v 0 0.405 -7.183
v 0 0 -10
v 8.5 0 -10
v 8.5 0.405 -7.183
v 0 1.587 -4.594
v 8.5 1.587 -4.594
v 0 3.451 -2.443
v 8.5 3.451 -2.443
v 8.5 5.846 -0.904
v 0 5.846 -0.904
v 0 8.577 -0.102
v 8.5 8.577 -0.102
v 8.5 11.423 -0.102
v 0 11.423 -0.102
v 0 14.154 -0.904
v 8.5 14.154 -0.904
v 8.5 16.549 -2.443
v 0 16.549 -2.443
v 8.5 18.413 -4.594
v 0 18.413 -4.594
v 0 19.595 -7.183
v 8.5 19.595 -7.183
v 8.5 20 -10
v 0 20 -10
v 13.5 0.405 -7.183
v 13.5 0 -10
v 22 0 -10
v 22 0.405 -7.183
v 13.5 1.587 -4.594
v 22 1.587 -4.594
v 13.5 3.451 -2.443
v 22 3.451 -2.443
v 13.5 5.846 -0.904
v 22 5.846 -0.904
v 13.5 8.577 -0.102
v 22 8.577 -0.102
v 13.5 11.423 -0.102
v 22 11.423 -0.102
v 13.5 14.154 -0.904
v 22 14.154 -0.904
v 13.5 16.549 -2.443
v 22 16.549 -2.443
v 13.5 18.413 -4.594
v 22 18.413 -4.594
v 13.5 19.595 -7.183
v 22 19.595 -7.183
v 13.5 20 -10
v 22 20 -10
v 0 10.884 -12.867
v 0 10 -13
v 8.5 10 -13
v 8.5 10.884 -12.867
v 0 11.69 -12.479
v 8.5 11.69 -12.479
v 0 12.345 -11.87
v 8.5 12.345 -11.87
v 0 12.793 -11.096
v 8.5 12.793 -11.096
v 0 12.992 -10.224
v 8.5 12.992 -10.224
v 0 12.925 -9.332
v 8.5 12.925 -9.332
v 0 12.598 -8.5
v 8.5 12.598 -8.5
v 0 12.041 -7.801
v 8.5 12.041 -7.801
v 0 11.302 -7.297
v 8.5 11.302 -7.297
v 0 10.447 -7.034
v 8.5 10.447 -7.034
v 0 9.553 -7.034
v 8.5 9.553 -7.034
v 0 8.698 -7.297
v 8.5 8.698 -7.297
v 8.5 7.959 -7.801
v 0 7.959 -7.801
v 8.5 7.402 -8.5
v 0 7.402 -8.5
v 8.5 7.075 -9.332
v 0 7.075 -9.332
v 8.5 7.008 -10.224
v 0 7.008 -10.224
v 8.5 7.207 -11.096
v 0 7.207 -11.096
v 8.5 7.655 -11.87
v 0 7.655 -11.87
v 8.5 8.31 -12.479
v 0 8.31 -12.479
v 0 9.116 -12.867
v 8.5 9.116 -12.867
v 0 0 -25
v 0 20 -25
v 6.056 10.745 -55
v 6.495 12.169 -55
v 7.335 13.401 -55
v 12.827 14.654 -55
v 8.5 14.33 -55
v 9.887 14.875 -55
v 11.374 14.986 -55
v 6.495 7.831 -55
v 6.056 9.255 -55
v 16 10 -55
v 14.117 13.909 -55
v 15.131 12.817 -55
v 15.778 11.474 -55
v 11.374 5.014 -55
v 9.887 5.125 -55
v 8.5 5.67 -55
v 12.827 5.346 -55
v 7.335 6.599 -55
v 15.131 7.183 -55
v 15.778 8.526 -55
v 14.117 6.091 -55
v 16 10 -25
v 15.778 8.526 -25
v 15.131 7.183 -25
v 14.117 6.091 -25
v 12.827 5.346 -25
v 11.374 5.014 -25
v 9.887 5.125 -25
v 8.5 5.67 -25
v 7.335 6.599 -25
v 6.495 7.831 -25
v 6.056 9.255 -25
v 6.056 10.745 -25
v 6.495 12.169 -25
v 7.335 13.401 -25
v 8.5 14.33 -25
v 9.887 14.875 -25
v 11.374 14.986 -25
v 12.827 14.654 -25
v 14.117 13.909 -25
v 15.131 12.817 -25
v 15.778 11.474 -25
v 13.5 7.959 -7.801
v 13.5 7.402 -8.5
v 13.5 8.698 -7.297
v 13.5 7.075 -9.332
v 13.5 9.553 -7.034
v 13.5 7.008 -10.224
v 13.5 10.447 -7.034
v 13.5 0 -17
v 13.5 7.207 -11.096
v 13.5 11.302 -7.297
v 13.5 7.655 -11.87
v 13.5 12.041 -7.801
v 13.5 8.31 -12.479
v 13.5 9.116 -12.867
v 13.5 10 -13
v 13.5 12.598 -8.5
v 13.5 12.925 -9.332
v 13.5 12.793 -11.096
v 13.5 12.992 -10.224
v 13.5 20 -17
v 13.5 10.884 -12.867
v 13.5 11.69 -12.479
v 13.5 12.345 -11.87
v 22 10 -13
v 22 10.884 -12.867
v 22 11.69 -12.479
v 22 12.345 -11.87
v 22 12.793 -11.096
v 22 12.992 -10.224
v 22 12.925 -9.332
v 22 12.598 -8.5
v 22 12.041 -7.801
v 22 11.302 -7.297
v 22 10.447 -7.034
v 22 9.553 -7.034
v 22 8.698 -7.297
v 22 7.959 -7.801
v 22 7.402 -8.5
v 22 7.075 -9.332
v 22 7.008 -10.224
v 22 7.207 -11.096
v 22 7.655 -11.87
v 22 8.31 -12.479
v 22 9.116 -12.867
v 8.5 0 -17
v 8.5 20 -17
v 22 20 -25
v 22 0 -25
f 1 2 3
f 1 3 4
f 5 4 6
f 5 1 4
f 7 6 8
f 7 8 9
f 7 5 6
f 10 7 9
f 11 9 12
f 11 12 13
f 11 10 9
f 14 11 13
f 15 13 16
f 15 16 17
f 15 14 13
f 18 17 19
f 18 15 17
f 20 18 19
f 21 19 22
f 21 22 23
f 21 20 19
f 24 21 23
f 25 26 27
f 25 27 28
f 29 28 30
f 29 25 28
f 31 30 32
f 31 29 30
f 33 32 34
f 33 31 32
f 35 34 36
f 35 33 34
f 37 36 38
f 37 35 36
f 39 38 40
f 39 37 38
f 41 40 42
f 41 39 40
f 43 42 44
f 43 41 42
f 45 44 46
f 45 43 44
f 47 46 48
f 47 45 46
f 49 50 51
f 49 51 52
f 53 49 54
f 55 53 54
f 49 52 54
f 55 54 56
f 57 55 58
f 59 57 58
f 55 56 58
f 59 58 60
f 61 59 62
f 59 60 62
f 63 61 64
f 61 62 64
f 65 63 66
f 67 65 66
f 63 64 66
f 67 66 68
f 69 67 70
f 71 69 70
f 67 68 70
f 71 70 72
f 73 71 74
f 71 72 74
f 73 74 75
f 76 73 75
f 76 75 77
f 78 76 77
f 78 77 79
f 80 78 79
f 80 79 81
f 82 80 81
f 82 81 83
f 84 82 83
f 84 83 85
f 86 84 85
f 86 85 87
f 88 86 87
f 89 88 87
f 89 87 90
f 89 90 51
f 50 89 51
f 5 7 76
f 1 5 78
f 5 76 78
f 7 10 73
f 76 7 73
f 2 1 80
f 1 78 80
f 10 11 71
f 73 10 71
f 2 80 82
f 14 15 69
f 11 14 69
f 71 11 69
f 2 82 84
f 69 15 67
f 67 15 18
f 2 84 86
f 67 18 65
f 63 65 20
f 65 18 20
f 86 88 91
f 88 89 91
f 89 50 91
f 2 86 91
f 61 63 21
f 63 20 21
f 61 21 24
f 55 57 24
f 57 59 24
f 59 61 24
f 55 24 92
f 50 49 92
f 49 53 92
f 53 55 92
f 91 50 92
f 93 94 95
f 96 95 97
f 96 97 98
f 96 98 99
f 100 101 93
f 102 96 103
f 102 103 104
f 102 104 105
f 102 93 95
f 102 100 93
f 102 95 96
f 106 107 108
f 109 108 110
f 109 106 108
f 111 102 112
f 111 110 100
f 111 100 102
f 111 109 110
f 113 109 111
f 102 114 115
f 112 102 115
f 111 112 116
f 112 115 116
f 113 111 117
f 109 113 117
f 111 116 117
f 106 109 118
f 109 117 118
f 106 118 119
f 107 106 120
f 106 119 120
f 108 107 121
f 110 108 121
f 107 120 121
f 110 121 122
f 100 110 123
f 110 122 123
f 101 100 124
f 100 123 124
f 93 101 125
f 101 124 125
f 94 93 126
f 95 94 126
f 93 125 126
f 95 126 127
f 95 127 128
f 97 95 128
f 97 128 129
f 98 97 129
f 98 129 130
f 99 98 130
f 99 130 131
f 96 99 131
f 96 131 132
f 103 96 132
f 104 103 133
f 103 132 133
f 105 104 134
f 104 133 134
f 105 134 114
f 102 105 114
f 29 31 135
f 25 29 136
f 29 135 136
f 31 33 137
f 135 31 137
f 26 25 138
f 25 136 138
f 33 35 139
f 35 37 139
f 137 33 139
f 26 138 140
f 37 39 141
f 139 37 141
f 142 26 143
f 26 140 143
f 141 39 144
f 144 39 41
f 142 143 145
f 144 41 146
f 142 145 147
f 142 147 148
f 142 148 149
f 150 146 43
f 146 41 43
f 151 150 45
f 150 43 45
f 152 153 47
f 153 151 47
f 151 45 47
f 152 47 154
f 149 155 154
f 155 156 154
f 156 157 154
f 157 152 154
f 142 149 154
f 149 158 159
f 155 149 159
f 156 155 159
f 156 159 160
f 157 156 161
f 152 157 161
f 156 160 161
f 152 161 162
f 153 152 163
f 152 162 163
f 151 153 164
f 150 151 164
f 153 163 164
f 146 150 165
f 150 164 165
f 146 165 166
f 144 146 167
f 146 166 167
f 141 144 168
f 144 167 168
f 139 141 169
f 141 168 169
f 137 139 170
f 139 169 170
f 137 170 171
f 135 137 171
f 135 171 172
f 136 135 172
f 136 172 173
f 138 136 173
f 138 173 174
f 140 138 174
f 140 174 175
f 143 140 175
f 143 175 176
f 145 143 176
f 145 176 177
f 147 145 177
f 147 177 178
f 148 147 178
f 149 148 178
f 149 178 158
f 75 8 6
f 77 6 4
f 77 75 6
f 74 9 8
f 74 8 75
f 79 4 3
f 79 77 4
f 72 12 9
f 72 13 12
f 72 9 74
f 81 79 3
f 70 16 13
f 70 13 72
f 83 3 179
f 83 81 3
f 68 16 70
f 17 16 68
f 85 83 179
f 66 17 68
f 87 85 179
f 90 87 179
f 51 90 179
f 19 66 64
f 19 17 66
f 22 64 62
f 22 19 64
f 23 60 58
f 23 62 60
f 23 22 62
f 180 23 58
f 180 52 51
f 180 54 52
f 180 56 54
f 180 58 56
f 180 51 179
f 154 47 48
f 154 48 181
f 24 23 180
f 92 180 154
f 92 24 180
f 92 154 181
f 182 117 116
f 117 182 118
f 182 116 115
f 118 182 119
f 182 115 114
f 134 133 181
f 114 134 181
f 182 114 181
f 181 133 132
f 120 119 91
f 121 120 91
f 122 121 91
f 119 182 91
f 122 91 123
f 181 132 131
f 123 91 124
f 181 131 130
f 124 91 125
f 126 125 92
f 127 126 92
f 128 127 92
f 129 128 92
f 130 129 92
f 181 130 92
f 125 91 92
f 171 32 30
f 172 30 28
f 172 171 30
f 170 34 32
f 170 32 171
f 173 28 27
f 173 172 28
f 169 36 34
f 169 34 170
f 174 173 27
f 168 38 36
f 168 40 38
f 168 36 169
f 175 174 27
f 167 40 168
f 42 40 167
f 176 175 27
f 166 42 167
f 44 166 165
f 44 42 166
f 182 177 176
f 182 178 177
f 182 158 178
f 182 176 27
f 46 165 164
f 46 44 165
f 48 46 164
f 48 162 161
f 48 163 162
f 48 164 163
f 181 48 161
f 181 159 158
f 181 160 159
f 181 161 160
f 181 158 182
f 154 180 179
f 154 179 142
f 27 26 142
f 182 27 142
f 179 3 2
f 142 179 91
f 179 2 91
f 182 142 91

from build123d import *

# Parameters (mm, degrees)
SKETCH1_W           = 25
SKETCH1_H           = 20
BOSS_EXTRUDE1_DEPTH = 22
FILLET1_RADIUS      = 10
FILLET1_LENGTH      = 22
SKETCH2_R           = 5
BOSS_EXTRUDE2_DEPTH = 30
SKETCH3_R           = 3
CUT_EXTRUDE1_DEPTH  = 30
SKETCH4_W           = 5
SKETCH4_H           = 34
CUT_EXTRUDE2_DEPTH  = 31


with BuildPart() as part:
    # Sketch1 → Boss-Extrude1 (new body)
    with BuildSketch(Plane(origin=(0, 0, 0), x_dir=(0, 0, -1), z_dir=(1, 0, 0))):
        with Locations((12.5, 10)):
            Rectangle(SKETCH1_W, SKETCH1_H)
    extrude(amount=BOSS_EXTRUDE1_DEPTH)

    # Fillet1: full round fillet: the end face becomes a half cylinder, R = half its width
    fillet1_face = Plane((11, 10, 0), x_dir=(-1, 0, 0), z_dir=(0, 0, 1))  # on the end face: x along it, z out of the body
    fillet1_slab = fillet1_face.offset(-FILLET1_RADIUS / 2) * Box(FILLET1_LENGTH, 2 * FILLET1_RADIUS, FILLET1_RADIUS, mode=Mode.PRIVATE)  # the body's end, R deep
    fillet1_round = Plane((11, 10, -10), x_dir=(0, 0, 1), z_dir=(-1, 0, 0)) * Cylinder(FILLET1_RADIUS, FILLET1_LENGTH, mode=Mode.PRIVATE)  # its axis R under the face
    add(fillet1_slab - fillet1_round, mode=Mode.SUBTRACT)

    # Sketch2 → Boss-Extrude2 (add)
    with BuildSketch(Plane(origin=(0, 0, -25), x_dir=(-1, 0, 0), z_dir=(0, 0, -1))):
        with Locations(Location((-11, 10, 0), (0, 0, 180))):
            Circle(SKETCH2_R)
    extrude(amount=BOSS_EXTRUDE2_DEPTH)

    # Sketch3 → Cut-Extrude1 (cut)
    with BuildSketch(Plane(origin=(22, 0, 0), x_dir=(0, 0, -1), z_dir=(1, 0, 0))):
        with Locations((10, 10)):
            Circle(SKETCH3_R)
    extrude(amount=-CUT_EXTRUDE1_DEPTH, mode=Mode.SUBTRACT)

    # Sketch4 → Cut-Extrude2 (cut)
    with BuildSketch(Plane(origin=(0, 20, 0), x_dir=(1, 0, 0), z_dir=(0, 1, 0))):
        with Locations((11, 0)):
            Rectangle(SKETCH4_W, SKETCH4_H)
    extrude(amount=-CUT_EXTRUDE2_DEPTH, mode=Mode.SUBTRACT)


solid = part.part
